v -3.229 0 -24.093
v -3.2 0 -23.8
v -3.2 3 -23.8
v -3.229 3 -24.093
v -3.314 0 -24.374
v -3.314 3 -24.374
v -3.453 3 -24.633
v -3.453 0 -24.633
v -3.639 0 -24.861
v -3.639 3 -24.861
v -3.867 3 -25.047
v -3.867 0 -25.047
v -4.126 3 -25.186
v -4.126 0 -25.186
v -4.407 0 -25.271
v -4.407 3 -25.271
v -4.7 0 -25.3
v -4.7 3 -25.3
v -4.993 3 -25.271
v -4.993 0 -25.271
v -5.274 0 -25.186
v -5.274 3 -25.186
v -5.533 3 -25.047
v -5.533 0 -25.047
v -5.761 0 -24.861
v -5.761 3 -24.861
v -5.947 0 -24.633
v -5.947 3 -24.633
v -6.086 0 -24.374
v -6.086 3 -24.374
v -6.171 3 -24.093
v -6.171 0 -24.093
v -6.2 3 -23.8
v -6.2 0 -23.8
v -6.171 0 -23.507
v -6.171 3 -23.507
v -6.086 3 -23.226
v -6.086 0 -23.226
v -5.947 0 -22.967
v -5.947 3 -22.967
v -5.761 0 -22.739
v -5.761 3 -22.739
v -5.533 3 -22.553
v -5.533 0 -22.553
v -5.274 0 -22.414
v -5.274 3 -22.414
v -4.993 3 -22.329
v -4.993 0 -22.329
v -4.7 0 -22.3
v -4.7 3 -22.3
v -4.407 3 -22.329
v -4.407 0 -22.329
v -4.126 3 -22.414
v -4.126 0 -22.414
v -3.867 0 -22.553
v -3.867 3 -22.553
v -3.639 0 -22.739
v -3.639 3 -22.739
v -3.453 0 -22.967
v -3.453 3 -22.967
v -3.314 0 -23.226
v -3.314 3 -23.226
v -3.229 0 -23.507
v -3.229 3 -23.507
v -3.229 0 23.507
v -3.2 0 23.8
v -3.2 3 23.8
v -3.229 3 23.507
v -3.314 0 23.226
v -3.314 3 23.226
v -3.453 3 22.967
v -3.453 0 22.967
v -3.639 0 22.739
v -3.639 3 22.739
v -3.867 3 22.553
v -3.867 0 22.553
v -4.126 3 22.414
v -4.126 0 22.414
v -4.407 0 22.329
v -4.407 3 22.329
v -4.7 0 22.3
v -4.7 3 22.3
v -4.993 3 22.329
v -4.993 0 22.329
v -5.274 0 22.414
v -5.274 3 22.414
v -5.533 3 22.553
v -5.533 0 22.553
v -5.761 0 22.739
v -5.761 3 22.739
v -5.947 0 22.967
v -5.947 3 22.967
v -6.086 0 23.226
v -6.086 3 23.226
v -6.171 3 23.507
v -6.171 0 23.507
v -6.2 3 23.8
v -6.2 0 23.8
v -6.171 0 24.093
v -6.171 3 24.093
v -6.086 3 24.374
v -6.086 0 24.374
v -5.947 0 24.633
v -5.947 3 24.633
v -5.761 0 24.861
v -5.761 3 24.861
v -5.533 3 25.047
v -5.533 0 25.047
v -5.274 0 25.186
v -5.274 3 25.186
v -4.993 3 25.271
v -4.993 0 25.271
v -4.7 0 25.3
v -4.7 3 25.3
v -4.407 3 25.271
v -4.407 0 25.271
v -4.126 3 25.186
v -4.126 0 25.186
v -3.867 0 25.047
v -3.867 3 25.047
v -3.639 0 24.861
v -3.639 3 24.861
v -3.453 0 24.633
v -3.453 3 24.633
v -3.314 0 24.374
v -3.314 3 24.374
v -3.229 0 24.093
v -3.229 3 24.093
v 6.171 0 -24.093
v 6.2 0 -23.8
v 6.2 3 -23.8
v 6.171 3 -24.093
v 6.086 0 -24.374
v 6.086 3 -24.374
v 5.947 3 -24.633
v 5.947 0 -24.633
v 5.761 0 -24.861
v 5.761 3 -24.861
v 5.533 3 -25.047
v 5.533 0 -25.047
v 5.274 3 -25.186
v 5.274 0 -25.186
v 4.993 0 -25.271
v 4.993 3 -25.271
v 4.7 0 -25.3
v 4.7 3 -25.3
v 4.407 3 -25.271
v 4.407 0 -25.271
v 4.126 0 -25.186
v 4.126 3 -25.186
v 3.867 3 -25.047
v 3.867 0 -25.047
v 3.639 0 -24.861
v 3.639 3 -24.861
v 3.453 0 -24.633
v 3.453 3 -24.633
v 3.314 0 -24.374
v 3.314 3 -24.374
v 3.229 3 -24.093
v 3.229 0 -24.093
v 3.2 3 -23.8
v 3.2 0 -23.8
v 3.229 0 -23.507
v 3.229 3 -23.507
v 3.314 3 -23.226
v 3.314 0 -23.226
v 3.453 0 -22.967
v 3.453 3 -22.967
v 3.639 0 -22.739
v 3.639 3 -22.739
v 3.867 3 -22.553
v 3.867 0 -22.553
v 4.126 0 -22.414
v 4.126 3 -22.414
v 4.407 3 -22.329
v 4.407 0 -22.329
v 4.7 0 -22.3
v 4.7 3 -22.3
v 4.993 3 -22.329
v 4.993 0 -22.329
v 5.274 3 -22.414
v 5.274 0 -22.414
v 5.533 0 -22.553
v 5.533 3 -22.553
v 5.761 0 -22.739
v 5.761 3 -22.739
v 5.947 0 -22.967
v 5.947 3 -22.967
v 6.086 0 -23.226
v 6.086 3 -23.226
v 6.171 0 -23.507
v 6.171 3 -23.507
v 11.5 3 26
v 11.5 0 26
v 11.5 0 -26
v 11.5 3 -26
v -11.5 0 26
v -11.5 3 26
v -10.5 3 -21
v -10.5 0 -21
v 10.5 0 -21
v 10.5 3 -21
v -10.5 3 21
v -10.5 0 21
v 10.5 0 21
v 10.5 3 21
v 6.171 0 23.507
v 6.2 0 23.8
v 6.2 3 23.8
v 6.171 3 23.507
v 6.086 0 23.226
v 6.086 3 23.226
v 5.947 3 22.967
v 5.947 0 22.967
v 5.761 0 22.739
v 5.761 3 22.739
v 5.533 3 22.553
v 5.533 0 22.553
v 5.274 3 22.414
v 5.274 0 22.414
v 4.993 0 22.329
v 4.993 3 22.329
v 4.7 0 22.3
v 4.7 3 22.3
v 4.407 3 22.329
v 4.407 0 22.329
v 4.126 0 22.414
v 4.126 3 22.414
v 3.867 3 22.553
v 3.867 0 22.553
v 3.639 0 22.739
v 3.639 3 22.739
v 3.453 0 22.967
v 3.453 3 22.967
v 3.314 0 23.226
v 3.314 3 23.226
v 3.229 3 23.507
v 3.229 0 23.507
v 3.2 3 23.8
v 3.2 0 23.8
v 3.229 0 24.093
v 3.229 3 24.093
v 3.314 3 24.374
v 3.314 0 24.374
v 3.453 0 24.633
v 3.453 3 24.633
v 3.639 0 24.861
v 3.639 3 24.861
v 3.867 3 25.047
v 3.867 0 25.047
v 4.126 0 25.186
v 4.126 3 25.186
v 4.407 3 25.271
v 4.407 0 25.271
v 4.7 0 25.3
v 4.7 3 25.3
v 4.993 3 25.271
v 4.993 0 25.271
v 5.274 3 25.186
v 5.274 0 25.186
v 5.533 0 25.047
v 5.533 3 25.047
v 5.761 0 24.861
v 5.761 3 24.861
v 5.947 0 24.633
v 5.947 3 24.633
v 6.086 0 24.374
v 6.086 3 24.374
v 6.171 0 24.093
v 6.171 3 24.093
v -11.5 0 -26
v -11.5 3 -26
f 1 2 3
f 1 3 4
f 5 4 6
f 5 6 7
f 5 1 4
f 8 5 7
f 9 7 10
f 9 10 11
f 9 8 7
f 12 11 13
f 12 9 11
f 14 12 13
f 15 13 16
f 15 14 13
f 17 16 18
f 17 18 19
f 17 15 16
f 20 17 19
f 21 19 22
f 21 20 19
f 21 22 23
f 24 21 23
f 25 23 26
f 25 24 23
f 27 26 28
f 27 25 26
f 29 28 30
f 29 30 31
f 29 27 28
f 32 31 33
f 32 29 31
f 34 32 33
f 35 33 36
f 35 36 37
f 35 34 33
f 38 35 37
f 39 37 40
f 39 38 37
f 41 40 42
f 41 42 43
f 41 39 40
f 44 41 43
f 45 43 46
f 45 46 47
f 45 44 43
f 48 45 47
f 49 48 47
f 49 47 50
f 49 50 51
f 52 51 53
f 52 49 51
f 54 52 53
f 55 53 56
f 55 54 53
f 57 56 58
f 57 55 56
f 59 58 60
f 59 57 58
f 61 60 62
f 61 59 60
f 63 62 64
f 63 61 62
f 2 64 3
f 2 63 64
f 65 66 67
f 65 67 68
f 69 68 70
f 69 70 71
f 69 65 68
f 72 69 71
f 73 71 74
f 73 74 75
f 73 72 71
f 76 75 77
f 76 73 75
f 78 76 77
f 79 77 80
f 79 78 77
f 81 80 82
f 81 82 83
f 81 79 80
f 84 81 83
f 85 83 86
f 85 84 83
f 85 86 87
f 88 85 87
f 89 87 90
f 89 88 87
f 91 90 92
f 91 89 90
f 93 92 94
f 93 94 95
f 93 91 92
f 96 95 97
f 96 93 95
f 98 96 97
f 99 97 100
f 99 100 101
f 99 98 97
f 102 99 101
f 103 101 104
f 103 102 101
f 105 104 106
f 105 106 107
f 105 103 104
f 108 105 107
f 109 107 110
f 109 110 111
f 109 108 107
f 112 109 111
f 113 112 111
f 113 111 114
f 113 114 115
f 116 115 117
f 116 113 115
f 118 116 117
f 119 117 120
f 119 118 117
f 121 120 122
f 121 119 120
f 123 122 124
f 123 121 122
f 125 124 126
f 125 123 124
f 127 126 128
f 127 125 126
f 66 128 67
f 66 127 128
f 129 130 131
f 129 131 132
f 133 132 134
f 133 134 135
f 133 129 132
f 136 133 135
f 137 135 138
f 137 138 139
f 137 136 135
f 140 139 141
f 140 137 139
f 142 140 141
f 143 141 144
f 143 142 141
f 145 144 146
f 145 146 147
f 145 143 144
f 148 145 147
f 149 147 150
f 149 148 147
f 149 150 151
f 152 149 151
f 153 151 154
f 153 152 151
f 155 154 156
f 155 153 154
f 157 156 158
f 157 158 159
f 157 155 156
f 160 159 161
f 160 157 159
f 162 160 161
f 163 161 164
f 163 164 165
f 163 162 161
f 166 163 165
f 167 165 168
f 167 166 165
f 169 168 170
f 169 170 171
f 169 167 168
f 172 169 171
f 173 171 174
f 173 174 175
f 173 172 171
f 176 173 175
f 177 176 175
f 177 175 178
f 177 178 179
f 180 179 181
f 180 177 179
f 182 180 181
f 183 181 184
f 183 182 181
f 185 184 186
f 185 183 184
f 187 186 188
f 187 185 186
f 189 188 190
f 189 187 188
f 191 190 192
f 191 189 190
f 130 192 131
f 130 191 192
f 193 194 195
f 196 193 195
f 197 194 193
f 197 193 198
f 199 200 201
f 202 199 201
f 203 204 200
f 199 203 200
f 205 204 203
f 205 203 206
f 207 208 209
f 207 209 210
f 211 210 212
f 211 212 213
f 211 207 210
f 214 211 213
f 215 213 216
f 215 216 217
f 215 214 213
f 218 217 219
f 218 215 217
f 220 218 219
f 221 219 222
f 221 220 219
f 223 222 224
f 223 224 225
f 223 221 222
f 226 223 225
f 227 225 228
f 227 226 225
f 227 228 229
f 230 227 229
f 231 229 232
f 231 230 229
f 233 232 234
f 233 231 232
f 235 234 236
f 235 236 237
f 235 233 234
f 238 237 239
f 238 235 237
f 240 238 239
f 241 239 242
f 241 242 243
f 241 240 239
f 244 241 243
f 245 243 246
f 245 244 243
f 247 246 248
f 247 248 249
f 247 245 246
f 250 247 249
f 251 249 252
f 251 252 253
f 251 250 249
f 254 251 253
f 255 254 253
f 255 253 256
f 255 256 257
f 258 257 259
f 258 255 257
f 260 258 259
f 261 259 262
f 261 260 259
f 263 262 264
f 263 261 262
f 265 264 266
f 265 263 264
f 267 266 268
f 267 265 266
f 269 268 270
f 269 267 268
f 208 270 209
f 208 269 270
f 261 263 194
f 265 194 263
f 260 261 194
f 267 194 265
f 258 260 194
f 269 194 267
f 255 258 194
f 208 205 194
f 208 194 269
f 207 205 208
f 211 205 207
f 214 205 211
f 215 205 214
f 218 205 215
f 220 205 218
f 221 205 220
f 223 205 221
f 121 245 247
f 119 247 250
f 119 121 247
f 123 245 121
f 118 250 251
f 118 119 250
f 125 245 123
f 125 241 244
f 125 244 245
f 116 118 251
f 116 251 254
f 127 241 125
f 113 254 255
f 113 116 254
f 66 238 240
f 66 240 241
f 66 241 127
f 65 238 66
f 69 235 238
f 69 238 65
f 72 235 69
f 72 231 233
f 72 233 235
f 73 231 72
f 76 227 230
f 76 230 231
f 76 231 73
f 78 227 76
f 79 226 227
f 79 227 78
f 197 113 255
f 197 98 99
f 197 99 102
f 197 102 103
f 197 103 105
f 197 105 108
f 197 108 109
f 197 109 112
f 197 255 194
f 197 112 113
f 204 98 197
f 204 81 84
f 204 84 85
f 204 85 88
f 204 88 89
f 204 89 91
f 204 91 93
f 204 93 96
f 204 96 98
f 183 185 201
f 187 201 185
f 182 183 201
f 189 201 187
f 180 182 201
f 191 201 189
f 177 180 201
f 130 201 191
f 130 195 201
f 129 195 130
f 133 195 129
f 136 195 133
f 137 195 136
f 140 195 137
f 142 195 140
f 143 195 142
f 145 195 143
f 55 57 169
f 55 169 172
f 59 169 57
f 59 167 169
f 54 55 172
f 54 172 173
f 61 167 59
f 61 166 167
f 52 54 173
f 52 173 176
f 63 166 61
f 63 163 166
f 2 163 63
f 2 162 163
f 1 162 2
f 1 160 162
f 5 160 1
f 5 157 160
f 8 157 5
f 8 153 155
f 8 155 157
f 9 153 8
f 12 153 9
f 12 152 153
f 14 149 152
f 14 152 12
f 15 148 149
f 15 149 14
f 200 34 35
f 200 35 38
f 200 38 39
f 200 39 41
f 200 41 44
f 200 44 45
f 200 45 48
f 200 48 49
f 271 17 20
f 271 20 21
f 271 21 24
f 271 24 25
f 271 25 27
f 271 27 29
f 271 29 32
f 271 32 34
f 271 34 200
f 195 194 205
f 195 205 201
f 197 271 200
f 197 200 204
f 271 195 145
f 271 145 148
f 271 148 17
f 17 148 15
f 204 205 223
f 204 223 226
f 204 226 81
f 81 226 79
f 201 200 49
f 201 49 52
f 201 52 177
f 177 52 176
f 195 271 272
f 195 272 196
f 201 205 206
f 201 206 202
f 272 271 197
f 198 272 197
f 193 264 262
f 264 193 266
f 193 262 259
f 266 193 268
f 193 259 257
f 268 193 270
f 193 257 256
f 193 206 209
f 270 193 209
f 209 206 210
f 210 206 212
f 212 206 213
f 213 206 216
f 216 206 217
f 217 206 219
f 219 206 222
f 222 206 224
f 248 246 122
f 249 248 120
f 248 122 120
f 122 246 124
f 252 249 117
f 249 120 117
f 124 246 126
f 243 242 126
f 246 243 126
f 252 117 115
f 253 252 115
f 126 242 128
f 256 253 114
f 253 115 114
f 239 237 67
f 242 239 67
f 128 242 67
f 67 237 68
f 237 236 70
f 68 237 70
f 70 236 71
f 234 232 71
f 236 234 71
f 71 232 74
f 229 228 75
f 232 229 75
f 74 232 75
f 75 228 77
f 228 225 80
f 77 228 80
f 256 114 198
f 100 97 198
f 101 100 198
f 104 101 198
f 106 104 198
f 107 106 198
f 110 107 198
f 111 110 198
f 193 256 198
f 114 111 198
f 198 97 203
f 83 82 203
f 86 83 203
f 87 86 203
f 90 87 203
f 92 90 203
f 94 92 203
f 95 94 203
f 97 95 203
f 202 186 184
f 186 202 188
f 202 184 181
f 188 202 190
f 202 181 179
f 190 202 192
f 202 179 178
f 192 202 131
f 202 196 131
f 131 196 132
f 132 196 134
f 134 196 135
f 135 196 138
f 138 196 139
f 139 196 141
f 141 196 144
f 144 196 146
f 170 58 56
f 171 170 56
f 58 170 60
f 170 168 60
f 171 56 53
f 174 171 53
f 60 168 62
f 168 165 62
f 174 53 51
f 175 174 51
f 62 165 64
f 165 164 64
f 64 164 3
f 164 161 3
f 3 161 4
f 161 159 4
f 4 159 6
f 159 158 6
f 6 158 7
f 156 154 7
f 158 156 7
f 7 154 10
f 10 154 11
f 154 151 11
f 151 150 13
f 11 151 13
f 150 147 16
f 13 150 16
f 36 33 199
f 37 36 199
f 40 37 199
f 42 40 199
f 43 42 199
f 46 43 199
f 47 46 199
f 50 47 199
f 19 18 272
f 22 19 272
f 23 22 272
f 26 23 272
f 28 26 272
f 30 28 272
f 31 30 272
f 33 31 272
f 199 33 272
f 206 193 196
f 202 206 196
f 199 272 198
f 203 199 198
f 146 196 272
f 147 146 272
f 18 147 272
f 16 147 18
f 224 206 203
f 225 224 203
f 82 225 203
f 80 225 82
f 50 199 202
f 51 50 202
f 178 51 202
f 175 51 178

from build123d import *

# Parameters (mm, degrees)
SKETCH_1_R      = 1.5
SKETCH_1_W      = 21
SKETCH_1_H      = 42
EXTRUDE_1_DEPTH = 3


with BuildPart() as part:
    # 草圖1 → 填料-伸長1 (new body)
    with BuildSketch(Plane(origin=(0, 0, 0), x_dir=(1, 0, 0), z_dir=(0, 1, 0))):
        Polygon((11.5, 22), (11.5, -22), (11.5, -26), (-11.5, -26), (-11.5, -22), (-11.5, 22), (-11.5, 26), (11.5, 26), align=None)
        with Locations((-4.7, 23.8)):
            Circle(SKETCH_1_R, mode=Mode.SUBTRACT)
        with Locations((4.7, 23.8)):
            Circle(SKETCH_1_R, mode=Mode.SUBTRACT)
        with Locations((4.7, -23.8)):
            Circle(SKETCH_1_R, mode=Mode.SUBTRACT)
        with Locations((-4.7, -23.8)):
            Circle(SKETCH_1_R, mode=Mode.SUBTRACT)
        Rectangle(SKETCH_1_W, SKETCH_1_H, mode=Mode.SUBTRACT)
    extrude(amount=EXTRUDE_1_DEPTH)


solid = part.part
